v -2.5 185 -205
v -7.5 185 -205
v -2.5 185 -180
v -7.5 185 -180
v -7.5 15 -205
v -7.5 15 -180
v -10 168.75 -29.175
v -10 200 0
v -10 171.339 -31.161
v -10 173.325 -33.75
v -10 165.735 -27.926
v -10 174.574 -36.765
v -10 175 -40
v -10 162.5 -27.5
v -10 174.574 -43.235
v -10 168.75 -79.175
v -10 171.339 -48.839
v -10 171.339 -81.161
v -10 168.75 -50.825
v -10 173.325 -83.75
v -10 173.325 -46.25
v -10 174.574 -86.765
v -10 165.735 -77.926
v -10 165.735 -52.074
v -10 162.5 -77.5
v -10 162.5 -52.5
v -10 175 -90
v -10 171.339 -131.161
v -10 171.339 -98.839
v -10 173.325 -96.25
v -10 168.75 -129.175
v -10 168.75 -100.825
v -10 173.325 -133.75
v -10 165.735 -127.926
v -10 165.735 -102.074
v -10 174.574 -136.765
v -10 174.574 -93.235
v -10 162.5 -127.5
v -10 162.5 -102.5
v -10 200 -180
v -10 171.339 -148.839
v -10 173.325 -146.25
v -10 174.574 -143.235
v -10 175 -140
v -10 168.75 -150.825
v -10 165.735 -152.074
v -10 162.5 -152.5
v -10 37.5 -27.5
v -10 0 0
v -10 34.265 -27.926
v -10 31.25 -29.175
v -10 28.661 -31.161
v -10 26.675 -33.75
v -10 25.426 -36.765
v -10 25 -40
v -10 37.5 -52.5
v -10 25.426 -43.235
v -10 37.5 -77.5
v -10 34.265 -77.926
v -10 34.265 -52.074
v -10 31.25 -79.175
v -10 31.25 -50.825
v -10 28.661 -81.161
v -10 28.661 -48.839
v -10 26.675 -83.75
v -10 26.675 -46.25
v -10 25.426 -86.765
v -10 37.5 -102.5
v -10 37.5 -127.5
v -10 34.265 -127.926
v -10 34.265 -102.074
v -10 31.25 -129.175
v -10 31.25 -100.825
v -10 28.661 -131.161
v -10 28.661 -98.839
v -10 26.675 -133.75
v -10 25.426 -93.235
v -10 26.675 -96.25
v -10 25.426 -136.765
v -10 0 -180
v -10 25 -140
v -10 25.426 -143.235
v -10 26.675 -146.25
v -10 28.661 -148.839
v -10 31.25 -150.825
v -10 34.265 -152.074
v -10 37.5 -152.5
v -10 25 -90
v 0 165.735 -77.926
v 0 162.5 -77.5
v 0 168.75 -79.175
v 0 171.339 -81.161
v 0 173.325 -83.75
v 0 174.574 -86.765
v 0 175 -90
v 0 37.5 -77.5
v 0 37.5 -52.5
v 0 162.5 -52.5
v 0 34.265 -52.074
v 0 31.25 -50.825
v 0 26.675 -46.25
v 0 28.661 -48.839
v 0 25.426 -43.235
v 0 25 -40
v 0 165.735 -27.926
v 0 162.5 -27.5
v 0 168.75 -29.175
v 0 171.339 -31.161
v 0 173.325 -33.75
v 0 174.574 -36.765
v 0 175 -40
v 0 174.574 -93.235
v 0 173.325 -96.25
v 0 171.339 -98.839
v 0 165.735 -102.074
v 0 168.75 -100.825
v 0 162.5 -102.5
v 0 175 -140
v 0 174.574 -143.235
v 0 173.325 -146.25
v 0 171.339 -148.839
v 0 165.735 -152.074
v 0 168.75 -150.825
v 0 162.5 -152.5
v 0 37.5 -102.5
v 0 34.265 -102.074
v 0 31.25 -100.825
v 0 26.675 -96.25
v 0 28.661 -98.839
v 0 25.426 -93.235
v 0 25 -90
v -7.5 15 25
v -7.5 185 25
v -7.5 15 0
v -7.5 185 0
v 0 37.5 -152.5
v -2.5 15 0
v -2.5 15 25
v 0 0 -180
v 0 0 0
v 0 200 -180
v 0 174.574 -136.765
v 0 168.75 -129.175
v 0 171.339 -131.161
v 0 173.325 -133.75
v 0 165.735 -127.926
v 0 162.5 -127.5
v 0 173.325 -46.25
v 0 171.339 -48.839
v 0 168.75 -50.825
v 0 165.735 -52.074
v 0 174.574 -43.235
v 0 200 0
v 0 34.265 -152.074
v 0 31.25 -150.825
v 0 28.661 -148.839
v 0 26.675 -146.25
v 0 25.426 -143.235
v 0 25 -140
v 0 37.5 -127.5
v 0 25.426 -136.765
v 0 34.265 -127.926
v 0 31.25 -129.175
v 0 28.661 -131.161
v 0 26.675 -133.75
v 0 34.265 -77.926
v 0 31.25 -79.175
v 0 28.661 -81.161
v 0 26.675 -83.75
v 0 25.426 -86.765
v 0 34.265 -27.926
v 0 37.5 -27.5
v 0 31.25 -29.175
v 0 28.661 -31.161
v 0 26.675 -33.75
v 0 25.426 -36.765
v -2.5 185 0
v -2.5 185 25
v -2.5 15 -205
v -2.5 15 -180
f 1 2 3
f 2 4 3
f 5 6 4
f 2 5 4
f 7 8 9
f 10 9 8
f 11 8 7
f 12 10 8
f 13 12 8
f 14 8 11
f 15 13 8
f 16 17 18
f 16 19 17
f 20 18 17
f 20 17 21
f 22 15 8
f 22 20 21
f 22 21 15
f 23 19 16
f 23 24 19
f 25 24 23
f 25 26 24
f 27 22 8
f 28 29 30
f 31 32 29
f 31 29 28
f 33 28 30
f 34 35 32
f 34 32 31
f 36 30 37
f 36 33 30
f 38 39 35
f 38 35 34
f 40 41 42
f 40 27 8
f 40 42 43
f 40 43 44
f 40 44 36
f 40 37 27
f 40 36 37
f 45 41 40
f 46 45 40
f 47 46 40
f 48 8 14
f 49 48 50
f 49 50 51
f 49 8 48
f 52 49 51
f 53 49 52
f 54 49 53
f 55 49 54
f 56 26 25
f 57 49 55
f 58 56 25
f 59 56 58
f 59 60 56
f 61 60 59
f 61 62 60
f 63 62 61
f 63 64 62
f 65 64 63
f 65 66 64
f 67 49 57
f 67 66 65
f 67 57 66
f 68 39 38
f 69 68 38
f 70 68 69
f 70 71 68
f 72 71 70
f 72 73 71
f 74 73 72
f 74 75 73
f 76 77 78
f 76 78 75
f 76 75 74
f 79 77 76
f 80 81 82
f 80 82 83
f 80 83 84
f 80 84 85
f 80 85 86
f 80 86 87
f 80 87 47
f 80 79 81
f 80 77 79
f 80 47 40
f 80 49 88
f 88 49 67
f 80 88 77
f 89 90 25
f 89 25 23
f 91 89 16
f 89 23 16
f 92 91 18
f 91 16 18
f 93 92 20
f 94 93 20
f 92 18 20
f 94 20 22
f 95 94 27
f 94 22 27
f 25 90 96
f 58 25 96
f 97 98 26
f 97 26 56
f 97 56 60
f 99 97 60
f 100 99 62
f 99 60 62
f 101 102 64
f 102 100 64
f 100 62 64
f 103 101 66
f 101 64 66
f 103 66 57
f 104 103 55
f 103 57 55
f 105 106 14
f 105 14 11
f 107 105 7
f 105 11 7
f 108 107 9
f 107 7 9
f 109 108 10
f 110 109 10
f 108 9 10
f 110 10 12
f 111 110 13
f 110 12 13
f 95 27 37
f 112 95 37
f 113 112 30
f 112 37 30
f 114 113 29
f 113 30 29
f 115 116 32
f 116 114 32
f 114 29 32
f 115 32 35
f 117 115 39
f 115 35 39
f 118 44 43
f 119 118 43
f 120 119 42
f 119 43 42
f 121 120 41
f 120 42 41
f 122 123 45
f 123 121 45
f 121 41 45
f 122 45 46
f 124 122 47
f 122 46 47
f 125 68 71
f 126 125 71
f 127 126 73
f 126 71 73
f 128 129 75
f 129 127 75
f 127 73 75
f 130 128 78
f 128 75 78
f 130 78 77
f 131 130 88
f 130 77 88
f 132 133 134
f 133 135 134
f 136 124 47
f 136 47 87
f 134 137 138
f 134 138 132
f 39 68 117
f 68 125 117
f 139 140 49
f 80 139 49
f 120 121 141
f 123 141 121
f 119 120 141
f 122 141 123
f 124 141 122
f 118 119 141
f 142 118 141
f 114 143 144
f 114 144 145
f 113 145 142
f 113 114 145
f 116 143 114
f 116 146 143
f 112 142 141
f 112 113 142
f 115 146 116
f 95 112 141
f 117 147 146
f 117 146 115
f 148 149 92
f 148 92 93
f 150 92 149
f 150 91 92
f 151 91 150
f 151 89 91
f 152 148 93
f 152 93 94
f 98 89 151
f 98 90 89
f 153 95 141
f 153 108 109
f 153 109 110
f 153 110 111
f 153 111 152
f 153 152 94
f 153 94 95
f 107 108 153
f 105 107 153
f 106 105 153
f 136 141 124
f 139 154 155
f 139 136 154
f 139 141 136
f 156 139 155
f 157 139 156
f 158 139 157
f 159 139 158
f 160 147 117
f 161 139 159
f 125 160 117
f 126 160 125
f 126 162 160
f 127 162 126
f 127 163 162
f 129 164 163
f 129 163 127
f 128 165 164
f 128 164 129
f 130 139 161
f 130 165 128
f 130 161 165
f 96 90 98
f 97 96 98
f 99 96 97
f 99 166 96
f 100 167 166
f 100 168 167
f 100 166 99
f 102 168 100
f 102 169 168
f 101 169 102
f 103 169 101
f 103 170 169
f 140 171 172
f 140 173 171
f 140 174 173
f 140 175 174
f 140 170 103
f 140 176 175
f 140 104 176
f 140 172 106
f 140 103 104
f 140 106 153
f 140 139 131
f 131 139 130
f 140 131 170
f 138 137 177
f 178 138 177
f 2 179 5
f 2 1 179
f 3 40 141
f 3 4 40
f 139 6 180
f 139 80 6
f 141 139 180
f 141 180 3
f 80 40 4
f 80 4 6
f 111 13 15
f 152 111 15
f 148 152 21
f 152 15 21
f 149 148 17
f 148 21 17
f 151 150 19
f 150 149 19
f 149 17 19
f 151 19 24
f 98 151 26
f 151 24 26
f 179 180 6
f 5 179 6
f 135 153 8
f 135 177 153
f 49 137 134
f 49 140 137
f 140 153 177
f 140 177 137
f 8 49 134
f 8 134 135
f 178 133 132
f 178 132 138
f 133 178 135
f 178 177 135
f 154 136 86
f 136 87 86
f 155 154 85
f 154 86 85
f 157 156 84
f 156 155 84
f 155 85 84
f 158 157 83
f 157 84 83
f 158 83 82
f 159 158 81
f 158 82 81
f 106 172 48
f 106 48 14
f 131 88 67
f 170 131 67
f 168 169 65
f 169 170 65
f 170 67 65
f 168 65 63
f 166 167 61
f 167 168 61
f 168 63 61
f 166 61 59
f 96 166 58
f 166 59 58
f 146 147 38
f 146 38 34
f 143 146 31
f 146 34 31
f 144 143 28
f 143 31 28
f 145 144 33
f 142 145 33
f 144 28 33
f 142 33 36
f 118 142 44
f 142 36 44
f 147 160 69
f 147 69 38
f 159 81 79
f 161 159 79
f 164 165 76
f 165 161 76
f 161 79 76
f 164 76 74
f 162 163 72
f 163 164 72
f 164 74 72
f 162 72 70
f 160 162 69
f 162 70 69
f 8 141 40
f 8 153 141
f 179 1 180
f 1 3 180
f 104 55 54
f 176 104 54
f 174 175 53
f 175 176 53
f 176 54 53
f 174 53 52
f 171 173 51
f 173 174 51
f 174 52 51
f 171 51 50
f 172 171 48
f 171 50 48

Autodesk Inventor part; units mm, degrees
ref_plane "YZ Plane" through (0, 0, 0) normal (1, 0, 0) x (0, 1, 0)
ref_plane "XZ Plane" through (0, 0, 0) normal (0, 1, 0) x (-1, 0, 0)
ref_plane "XY Plane" through (0, 0, 0) normal (0, 0, 1) x (1, 0, 0)
sketch "Sketch1" plane through (0, 0, 0) normal (0, 1, 0) x (-1, 0, 0)
  line L0 (0, 0) -> (10, 0)
  line L1 (10, 0) -> (10, -180)
  line L2 (10, -180) -> (0, -180)
  line L3 (0, -180) -> (0, 0)
  dimension "d0" = 10
  dimension "d1" = 180
extrude "Extrusion1" add sketch "Sketch1" along normal blind 200
sketch "Sketch2" plane through (-10, 0, 0) normal (0, 0, 1) x (1, 0, 0)
  line L0 (10, 0) -> (0, 0) projected
  line L1 (10, 200) -> (0, 200) projected
  line L2 (2.5, 0) -> (7.5, 0)
  line L3 (7.5, 0) -> (7.5, 200)
  line L4 (7.5, 200) -> (2.5, 200)
  line L5 (2.5, 200) -> (2.5, 0)
  line L6 (10, 0) -> (10, 200) projected
  line L7 (0, 200) -> (10, 200)
  line L8 (10, 200) -> (10, 185)
  line L9 (10, 185) -> (0, 185)
  line L10 (0, 185) -> (0, 200)
  line L11 (0, 0) -> (10, 0)
  line L12 (10, 0) -> (10, 15)
  line L13 (10, 15) -> (0, 15)
  line L14 (0, 15) -> (0, 0)
  point P0 (2.5, 15)
  point P1 (7.5, 15)
  point P2 (7.5, 185)
  point P3 (2.5, 185)
  dimension "d4" = 5
  dimension "d5" = 15
  dimension "d6" = 15
extrude "Extrusion2" add sketch "Sketch2" along normal blind 25 contours L13 L5 L9 L3
sketch "Sketch3" plane through (0, 0, -180) normal (0, 0, -1) x (-1, 0, 0)
  line L0 (2.5, 15) -> (7.5, 15)
  line L1 (7.5, 15) -> (7.5, 185)
  line L2 (7.5, 185) -> (2.5, 185)
  line L3 (2.5, 185) -> (2.5, 15)
  point P0 (0, 0)
  dimension "d9" = 5
  dimension "d10" = 170
extrude "Extrusion3" add sketch "Sketch3" along normal blind 25
sketch "Sketch4" plane through (0, 0, 0) normal (1, 0, 0) x (0, 0, -1)
  line L0 (27.5, 175) -> (52.5, 175)
  line L1 (52.5, 175) -> (52.5, 25)
  line L2 (52.5, 25) -> (27.5, 25)
  line L3 (27.5, 25) -> (27.5, 175)
  line L4 (77.5, 25) -> (102.5, 25)
  line L5 (102.5, 25) -> (102.5, 175)
  line L6 (102.5, 175) -> (77.5, 175)
  line L7 (77.5, 175) -> (77.5, 25)
  line L8 (127.5, 175) -> (152.5, 175)
  line L9 (152.5, 175) -> (152.5, 25)
  line L10 (152.5, 25) -> (127.5, 25)
  line L11 (127.5, 25) -> (127.5, 175)
  point P0 (0, 0)
  dimension "d13" = 25
  dimension "d14" = 150
  dimension "d15" = 25
  dimension "d16" = 25
extrude "Extrusion4" cut sketch "Sketch4" against normal blind 10
fillet "Fillet1" radius 12.5 12 edges at (-5, 175, -77.5) (-5, 175, -102.5) (-5, 175, -152.5) (-5, 175, -127.5) (-5, 175, -27.5) (-5, 175, -52.5) (-5, 25, -102.5) (-5, 25, -52.5) (-5, 25, -27.5) (-5, 25, -77.5) (-5, 25, -127.5) (-5, 25, -152.5)
properties part number "TSU_MM_Wall"
